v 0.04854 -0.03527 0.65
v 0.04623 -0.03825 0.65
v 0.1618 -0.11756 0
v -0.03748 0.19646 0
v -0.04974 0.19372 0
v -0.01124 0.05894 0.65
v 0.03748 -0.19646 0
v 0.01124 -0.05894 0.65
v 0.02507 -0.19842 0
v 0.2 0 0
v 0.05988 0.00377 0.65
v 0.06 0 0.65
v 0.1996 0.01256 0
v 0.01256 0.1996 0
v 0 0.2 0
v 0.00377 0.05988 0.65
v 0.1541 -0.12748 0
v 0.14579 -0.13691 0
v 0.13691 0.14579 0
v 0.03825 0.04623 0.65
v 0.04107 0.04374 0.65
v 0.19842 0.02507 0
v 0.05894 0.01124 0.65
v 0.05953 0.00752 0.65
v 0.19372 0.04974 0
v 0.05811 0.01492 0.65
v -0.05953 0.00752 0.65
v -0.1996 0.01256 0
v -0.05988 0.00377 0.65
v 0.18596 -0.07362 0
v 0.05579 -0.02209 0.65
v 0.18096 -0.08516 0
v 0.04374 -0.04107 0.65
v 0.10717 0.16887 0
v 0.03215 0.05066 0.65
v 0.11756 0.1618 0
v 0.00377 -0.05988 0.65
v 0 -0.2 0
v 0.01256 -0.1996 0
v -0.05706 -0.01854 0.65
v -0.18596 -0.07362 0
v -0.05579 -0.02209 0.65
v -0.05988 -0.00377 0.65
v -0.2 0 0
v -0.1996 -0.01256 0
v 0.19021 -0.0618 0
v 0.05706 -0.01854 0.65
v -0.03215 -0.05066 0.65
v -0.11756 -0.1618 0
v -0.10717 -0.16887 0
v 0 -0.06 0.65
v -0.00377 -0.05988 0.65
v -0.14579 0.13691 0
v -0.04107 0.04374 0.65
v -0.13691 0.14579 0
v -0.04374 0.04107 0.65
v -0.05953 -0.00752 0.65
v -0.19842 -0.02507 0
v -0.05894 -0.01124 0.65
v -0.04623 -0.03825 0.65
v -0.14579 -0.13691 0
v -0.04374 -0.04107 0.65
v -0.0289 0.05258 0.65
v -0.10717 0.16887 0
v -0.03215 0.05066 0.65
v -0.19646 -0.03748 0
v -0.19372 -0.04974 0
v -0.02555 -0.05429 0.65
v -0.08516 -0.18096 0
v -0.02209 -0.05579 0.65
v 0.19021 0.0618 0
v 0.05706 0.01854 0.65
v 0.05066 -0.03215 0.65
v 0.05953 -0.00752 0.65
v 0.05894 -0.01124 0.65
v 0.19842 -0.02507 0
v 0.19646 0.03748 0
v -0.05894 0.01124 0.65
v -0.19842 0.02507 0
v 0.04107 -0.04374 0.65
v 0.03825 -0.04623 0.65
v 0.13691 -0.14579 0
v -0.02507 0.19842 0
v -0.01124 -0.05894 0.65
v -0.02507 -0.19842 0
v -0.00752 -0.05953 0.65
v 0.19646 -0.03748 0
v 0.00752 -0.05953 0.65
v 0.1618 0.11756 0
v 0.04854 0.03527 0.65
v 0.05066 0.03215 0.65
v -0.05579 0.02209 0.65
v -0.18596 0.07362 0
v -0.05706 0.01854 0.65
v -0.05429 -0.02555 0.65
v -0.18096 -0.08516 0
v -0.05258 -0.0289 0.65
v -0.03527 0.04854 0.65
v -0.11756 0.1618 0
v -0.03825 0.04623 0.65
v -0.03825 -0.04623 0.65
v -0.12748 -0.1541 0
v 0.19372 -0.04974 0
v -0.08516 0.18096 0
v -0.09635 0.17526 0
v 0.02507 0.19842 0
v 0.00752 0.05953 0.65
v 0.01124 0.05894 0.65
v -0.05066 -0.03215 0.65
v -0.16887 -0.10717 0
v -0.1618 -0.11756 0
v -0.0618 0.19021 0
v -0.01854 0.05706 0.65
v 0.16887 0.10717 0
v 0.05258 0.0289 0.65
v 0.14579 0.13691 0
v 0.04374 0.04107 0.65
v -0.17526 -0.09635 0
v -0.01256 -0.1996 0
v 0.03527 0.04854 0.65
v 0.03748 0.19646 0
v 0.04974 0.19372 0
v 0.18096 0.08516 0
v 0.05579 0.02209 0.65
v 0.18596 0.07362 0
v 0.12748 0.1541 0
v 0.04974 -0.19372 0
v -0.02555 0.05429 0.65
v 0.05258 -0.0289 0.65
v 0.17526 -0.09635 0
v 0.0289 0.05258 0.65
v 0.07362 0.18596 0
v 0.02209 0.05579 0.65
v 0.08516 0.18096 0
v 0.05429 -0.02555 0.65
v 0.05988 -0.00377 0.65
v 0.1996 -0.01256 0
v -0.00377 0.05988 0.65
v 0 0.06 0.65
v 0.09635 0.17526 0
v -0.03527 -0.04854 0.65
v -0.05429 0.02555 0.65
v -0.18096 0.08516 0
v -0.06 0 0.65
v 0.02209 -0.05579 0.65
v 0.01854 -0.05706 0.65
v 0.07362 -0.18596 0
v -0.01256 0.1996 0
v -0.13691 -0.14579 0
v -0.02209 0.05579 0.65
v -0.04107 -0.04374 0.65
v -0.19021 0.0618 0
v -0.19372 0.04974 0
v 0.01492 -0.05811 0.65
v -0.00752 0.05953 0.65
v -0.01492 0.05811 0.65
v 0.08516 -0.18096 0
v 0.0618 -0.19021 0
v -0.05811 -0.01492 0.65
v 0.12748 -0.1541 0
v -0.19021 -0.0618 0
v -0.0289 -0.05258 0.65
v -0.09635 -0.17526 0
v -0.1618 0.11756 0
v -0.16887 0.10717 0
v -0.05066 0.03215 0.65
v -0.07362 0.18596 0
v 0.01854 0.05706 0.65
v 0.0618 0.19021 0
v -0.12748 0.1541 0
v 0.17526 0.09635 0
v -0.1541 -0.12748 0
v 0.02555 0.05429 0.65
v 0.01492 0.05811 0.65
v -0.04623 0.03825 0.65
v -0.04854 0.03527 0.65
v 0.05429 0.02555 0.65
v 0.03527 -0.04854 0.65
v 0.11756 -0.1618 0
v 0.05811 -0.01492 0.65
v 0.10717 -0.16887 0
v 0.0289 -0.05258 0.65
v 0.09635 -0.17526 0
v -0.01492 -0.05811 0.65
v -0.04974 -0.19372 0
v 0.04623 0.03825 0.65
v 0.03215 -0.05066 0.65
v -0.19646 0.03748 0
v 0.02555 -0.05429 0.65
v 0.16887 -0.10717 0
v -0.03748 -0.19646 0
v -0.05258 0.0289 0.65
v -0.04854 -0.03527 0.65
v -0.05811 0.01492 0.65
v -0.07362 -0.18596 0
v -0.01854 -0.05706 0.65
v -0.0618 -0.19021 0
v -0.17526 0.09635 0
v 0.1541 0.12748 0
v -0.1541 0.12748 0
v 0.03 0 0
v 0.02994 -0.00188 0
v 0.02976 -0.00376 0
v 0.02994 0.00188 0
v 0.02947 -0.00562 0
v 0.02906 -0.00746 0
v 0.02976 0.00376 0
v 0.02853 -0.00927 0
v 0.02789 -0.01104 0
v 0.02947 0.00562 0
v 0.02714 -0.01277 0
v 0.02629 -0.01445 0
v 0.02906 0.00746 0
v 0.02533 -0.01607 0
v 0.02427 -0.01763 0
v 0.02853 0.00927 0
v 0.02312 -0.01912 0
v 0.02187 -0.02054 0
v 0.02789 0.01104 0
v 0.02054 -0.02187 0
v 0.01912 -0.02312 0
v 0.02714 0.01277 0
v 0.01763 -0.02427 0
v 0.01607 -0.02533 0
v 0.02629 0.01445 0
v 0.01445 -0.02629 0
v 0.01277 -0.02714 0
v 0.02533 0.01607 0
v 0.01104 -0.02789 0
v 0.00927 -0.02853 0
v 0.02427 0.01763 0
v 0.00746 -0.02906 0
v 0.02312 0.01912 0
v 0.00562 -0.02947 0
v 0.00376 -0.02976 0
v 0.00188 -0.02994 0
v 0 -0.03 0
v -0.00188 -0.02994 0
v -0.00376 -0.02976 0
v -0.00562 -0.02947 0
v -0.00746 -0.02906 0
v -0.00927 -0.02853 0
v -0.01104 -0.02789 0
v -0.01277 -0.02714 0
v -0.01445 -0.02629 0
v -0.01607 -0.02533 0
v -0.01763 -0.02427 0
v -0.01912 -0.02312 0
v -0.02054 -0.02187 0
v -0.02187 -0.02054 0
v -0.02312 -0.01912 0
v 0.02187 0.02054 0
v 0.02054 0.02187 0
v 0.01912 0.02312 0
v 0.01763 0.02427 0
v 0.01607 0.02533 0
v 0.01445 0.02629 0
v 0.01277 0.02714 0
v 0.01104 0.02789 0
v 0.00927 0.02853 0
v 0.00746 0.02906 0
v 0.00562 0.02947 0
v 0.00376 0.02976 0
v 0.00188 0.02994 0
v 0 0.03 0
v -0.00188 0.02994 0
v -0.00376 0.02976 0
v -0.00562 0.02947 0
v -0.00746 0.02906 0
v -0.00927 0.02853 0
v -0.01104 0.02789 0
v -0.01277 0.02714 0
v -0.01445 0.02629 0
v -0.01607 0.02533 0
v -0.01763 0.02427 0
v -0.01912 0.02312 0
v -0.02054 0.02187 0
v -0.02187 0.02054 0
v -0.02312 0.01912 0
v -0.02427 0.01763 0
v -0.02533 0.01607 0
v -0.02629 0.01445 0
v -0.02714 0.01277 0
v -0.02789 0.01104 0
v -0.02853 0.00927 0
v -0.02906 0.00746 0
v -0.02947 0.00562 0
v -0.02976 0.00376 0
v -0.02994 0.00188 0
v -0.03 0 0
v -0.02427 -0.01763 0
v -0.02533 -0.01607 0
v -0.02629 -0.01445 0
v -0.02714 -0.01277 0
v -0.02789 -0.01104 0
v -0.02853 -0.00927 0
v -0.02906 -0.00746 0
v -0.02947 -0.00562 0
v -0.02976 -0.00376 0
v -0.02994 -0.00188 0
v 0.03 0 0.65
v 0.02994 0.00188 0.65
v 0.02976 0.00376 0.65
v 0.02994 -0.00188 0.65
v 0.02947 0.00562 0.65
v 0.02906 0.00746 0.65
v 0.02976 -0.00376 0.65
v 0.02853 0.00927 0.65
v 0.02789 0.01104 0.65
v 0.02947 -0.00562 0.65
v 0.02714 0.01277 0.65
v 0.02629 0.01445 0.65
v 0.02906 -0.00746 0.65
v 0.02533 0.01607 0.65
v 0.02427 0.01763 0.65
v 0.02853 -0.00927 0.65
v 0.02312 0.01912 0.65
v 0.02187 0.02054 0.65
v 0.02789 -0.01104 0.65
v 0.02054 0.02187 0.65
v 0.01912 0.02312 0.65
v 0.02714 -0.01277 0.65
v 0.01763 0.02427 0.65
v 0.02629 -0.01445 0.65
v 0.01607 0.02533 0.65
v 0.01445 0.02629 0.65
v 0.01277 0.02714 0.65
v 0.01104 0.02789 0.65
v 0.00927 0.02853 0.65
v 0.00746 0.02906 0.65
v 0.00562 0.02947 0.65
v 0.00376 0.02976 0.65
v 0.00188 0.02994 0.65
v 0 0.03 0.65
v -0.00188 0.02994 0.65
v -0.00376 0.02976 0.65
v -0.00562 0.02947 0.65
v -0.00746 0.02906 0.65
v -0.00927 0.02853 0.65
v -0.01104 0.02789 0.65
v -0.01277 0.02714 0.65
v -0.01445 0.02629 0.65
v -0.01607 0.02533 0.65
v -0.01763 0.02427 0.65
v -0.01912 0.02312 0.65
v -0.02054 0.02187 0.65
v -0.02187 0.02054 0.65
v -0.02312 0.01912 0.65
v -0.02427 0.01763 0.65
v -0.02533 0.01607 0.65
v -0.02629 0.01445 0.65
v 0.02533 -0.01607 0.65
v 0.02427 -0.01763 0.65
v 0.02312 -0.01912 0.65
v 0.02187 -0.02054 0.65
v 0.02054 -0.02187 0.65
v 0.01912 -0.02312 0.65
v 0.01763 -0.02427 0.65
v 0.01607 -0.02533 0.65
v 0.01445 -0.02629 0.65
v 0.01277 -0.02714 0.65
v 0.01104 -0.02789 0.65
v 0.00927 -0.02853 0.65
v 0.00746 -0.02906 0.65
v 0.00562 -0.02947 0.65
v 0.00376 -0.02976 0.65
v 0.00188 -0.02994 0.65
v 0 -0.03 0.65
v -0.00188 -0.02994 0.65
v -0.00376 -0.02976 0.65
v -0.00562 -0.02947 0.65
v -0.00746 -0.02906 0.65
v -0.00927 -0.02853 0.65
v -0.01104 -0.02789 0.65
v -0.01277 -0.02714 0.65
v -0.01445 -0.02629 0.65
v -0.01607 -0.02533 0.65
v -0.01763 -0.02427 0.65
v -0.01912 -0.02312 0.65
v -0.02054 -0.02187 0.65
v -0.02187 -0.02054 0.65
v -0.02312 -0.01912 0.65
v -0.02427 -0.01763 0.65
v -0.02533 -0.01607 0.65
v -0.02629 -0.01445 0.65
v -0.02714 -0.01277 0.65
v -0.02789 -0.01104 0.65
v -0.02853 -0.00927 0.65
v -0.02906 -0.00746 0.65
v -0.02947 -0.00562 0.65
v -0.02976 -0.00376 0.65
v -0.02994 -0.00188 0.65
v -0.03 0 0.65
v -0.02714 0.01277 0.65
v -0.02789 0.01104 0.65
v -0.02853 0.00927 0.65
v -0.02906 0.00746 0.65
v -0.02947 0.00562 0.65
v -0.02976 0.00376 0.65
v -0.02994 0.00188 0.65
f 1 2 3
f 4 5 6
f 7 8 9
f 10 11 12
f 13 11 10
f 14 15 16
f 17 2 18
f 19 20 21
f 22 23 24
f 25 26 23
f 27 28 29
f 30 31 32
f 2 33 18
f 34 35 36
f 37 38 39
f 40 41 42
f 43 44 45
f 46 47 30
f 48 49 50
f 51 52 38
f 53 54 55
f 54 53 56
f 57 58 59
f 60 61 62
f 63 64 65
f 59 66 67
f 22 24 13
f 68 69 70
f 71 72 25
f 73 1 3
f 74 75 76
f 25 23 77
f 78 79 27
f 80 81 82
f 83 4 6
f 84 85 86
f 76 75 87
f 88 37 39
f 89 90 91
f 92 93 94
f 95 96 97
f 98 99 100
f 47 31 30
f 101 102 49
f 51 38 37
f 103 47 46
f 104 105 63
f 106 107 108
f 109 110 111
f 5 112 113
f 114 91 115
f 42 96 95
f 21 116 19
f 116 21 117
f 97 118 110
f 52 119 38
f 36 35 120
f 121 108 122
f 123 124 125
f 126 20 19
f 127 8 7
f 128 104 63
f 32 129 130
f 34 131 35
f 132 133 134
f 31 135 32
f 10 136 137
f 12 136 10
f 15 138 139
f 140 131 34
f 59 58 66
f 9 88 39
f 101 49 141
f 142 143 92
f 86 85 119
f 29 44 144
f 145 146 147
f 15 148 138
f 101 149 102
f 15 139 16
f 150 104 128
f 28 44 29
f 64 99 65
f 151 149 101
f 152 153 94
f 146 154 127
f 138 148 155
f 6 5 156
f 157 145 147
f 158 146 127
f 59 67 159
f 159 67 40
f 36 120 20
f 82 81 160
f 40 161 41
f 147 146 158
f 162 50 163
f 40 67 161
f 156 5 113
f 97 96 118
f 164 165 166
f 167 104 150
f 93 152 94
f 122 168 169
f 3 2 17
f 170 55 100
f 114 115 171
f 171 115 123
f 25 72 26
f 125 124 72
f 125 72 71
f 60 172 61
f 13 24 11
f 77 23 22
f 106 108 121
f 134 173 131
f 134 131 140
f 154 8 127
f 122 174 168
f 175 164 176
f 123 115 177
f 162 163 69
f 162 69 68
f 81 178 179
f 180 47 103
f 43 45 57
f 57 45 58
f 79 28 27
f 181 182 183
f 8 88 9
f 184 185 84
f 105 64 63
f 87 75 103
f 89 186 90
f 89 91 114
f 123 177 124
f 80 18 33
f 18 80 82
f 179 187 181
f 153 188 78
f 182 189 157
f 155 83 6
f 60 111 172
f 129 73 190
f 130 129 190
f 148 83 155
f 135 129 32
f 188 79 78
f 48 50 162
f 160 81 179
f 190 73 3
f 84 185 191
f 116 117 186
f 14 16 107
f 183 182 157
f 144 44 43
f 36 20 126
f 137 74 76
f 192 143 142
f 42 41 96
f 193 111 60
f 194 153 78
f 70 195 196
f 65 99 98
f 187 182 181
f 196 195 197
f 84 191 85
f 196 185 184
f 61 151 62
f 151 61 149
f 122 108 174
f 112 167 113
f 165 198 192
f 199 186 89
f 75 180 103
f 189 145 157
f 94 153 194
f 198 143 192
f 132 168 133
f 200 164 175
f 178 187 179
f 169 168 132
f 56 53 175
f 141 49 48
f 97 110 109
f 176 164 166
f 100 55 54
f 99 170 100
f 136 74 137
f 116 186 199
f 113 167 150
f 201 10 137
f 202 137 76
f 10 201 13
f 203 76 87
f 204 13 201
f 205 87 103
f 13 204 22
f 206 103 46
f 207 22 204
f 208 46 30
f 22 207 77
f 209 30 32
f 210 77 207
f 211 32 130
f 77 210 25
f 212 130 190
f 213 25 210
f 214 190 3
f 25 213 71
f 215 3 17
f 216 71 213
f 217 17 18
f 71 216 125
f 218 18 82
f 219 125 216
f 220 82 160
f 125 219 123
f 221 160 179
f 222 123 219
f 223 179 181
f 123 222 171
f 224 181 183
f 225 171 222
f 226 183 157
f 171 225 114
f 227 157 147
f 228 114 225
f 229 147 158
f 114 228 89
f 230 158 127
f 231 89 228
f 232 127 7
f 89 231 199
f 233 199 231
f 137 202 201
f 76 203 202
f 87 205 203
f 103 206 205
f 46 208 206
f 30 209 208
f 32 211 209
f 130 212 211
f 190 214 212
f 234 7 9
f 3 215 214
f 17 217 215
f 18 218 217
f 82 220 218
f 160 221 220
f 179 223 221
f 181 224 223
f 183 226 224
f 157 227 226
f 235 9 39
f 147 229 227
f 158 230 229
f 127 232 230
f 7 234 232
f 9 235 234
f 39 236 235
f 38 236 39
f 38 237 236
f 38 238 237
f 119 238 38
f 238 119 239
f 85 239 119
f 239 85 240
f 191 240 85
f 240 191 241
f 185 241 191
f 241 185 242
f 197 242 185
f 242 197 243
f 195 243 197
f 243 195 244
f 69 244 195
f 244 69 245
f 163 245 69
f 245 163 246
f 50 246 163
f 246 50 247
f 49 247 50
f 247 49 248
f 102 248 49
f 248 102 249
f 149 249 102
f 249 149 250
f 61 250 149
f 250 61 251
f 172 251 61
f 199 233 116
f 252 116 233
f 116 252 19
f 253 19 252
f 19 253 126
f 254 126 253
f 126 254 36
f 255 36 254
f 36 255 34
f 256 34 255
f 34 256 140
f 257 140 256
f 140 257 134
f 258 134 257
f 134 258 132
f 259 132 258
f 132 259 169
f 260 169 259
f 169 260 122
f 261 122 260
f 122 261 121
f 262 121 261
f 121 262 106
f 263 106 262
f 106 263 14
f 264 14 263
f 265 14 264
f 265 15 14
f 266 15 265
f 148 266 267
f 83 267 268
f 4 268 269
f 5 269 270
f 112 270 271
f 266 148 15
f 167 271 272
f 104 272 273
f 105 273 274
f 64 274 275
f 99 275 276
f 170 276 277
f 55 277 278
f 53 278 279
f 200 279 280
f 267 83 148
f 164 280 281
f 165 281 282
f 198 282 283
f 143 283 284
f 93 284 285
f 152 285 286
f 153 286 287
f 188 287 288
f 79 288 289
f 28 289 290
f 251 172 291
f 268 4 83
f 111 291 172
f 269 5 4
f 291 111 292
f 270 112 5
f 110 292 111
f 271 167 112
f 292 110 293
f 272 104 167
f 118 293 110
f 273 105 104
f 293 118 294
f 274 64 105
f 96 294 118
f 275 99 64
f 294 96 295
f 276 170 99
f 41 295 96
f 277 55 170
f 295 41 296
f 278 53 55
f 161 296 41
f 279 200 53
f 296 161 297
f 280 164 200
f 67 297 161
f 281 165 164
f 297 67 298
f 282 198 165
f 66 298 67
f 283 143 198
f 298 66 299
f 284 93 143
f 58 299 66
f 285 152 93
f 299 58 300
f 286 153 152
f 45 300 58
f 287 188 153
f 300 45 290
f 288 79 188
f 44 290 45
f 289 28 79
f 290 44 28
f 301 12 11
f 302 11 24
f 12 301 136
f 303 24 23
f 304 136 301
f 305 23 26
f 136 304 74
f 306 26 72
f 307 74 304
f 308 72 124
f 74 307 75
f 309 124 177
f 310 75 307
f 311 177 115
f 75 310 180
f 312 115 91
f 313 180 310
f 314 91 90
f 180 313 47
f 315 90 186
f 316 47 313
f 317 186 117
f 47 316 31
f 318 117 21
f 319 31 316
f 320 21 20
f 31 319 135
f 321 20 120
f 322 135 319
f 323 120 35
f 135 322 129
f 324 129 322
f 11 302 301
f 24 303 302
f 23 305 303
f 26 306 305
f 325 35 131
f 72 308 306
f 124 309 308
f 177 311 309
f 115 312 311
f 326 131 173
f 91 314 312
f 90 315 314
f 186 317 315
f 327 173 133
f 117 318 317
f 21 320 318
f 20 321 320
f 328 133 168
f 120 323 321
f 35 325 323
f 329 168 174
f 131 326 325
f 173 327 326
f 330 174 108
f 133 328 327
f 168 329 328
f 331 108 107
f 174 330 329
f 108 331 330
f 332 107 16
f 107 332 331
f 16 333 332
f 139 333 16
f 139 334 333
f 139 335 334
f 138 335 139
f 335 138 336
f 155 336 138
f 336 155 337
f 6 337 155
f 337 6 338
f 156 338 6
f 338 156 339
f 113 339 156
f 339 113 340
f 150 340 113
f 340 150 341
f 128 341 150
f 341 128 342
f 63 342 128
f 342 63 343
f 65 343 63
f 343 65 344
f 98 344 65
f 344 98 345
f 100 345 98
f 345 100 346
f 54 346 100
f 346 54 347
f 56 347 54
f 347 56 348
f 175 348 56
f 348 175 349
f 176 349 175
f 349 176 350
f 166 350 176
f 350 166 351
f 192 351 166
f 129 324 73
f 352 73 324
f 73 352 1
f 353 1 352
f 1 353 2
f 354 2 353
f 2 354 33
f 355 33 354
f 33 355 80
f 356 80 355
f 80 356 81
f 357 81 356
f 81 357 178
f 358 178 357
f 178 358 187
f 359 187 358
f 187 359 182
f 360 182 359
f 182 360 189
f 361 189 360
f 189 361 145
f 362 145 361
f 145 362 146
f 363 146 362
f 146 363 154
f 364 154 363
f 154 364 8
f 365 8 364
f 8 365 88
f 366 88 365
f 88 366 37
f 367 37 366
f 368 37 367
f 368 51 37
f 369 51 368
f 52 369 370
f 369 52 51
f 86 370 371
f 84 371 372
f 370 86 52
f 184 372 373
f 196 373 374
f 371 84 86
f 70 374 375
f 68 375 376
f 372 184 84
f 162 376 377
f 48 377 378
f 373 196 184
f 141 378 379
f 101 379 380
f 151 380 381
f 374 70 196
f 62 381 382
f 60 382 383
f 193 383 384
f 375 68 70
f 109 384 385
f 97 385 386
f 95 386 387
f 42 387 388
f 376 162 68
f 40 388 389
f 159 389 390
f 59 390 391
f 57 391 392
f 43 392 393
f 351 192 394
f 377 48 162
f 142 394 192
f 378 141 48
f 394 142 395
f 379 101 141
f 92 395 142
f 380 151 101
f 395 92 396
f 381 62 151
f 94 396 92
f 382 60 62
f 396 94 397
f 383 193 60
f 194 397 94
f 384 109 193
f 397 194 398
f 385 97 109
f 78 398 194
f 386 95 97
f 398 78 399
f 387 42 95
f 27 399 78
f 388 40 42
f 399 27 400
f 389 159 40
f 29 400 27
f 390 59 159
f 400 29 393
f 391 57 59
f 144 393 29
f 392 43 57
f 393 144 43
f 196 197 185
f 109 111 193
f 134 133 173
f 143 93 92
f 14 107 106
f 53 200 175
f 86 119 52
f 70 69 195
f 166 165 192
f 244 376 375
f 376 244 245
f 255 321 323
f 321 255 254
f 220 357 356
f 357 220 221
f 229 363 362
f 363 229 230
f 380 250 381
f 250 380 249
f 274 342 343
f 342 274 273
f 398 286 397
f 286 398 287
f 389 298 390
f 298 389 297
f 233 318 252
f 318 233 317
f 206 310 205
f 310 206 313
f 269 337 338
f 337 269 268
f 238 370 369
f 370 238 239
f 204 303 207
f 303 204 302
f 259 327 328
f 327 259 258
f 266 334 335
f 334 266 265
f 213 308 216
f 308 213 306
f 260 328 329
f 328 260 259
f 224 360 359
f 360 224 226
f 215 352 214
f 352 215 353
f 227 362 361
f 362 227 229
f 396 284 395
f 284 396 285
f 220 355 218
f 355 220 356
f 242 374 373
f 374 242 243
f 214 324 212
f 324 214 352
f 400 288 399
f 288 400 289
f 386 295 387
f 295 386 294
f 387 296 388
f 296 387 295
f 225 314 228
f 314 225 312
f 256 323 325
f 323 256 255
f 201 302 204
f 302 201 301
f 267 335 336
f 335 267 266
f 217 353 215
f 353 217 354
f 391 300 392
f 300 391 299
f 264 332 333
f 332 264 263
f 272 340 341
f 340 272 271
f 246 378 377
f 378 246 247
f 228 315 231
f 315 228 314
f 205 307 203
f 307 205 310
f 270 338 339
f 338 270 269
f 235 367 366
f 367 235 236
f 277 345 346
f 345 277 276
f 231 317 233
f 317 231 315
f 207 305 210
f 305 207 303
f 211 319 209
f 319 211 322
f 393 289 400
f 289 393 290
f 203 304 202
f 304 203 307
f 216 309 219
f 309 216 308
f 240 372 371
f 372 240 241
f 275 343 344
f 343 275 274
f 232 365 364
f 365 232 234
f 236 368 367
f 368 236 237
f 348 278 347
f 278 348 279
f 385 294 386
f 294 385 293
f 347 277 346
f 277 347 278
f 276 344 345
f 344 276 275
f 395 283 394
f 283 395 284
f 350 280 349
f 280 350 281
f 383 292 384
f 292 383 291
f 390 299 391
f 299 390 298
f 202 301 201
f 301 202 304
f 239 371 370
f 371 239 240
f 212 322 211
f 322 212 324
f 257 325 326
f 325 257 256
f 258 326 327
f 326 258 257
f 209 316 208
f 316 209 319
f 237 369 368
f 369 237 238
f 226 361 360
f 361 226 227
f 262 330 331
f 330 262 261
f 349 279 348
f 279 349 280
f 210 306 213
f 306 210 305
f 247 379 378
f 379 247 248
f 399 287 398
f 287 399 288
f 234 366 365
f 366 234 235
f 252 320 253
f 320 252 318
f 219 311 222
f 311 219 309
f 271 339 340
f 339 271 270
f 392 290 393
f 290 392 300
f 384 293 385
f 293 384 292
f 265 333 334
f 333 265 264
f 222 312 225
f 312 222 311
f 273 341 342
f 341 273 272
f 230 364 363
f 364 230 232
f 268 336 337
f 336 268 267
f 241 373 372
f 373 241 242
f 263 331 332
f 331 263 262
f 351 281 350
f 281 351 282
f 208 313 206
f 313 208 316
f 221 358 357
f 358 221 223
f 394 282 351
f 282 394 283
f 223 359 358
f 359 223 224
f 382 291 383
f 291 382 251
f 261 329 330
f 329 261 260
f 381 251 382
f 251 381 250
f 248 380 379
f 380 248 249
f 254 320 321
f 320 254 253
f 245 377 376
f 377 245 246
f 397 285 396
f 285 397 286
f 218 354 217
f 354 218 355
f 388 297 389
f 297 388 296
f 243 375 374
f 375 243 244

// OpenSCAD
difference() {
  cylinder(h=0.65, r1 = 0.2, r2 = 0.06, center = false, $fn=100);
  cylinder(h=0.65, r=0.03,$fn=100);
}
